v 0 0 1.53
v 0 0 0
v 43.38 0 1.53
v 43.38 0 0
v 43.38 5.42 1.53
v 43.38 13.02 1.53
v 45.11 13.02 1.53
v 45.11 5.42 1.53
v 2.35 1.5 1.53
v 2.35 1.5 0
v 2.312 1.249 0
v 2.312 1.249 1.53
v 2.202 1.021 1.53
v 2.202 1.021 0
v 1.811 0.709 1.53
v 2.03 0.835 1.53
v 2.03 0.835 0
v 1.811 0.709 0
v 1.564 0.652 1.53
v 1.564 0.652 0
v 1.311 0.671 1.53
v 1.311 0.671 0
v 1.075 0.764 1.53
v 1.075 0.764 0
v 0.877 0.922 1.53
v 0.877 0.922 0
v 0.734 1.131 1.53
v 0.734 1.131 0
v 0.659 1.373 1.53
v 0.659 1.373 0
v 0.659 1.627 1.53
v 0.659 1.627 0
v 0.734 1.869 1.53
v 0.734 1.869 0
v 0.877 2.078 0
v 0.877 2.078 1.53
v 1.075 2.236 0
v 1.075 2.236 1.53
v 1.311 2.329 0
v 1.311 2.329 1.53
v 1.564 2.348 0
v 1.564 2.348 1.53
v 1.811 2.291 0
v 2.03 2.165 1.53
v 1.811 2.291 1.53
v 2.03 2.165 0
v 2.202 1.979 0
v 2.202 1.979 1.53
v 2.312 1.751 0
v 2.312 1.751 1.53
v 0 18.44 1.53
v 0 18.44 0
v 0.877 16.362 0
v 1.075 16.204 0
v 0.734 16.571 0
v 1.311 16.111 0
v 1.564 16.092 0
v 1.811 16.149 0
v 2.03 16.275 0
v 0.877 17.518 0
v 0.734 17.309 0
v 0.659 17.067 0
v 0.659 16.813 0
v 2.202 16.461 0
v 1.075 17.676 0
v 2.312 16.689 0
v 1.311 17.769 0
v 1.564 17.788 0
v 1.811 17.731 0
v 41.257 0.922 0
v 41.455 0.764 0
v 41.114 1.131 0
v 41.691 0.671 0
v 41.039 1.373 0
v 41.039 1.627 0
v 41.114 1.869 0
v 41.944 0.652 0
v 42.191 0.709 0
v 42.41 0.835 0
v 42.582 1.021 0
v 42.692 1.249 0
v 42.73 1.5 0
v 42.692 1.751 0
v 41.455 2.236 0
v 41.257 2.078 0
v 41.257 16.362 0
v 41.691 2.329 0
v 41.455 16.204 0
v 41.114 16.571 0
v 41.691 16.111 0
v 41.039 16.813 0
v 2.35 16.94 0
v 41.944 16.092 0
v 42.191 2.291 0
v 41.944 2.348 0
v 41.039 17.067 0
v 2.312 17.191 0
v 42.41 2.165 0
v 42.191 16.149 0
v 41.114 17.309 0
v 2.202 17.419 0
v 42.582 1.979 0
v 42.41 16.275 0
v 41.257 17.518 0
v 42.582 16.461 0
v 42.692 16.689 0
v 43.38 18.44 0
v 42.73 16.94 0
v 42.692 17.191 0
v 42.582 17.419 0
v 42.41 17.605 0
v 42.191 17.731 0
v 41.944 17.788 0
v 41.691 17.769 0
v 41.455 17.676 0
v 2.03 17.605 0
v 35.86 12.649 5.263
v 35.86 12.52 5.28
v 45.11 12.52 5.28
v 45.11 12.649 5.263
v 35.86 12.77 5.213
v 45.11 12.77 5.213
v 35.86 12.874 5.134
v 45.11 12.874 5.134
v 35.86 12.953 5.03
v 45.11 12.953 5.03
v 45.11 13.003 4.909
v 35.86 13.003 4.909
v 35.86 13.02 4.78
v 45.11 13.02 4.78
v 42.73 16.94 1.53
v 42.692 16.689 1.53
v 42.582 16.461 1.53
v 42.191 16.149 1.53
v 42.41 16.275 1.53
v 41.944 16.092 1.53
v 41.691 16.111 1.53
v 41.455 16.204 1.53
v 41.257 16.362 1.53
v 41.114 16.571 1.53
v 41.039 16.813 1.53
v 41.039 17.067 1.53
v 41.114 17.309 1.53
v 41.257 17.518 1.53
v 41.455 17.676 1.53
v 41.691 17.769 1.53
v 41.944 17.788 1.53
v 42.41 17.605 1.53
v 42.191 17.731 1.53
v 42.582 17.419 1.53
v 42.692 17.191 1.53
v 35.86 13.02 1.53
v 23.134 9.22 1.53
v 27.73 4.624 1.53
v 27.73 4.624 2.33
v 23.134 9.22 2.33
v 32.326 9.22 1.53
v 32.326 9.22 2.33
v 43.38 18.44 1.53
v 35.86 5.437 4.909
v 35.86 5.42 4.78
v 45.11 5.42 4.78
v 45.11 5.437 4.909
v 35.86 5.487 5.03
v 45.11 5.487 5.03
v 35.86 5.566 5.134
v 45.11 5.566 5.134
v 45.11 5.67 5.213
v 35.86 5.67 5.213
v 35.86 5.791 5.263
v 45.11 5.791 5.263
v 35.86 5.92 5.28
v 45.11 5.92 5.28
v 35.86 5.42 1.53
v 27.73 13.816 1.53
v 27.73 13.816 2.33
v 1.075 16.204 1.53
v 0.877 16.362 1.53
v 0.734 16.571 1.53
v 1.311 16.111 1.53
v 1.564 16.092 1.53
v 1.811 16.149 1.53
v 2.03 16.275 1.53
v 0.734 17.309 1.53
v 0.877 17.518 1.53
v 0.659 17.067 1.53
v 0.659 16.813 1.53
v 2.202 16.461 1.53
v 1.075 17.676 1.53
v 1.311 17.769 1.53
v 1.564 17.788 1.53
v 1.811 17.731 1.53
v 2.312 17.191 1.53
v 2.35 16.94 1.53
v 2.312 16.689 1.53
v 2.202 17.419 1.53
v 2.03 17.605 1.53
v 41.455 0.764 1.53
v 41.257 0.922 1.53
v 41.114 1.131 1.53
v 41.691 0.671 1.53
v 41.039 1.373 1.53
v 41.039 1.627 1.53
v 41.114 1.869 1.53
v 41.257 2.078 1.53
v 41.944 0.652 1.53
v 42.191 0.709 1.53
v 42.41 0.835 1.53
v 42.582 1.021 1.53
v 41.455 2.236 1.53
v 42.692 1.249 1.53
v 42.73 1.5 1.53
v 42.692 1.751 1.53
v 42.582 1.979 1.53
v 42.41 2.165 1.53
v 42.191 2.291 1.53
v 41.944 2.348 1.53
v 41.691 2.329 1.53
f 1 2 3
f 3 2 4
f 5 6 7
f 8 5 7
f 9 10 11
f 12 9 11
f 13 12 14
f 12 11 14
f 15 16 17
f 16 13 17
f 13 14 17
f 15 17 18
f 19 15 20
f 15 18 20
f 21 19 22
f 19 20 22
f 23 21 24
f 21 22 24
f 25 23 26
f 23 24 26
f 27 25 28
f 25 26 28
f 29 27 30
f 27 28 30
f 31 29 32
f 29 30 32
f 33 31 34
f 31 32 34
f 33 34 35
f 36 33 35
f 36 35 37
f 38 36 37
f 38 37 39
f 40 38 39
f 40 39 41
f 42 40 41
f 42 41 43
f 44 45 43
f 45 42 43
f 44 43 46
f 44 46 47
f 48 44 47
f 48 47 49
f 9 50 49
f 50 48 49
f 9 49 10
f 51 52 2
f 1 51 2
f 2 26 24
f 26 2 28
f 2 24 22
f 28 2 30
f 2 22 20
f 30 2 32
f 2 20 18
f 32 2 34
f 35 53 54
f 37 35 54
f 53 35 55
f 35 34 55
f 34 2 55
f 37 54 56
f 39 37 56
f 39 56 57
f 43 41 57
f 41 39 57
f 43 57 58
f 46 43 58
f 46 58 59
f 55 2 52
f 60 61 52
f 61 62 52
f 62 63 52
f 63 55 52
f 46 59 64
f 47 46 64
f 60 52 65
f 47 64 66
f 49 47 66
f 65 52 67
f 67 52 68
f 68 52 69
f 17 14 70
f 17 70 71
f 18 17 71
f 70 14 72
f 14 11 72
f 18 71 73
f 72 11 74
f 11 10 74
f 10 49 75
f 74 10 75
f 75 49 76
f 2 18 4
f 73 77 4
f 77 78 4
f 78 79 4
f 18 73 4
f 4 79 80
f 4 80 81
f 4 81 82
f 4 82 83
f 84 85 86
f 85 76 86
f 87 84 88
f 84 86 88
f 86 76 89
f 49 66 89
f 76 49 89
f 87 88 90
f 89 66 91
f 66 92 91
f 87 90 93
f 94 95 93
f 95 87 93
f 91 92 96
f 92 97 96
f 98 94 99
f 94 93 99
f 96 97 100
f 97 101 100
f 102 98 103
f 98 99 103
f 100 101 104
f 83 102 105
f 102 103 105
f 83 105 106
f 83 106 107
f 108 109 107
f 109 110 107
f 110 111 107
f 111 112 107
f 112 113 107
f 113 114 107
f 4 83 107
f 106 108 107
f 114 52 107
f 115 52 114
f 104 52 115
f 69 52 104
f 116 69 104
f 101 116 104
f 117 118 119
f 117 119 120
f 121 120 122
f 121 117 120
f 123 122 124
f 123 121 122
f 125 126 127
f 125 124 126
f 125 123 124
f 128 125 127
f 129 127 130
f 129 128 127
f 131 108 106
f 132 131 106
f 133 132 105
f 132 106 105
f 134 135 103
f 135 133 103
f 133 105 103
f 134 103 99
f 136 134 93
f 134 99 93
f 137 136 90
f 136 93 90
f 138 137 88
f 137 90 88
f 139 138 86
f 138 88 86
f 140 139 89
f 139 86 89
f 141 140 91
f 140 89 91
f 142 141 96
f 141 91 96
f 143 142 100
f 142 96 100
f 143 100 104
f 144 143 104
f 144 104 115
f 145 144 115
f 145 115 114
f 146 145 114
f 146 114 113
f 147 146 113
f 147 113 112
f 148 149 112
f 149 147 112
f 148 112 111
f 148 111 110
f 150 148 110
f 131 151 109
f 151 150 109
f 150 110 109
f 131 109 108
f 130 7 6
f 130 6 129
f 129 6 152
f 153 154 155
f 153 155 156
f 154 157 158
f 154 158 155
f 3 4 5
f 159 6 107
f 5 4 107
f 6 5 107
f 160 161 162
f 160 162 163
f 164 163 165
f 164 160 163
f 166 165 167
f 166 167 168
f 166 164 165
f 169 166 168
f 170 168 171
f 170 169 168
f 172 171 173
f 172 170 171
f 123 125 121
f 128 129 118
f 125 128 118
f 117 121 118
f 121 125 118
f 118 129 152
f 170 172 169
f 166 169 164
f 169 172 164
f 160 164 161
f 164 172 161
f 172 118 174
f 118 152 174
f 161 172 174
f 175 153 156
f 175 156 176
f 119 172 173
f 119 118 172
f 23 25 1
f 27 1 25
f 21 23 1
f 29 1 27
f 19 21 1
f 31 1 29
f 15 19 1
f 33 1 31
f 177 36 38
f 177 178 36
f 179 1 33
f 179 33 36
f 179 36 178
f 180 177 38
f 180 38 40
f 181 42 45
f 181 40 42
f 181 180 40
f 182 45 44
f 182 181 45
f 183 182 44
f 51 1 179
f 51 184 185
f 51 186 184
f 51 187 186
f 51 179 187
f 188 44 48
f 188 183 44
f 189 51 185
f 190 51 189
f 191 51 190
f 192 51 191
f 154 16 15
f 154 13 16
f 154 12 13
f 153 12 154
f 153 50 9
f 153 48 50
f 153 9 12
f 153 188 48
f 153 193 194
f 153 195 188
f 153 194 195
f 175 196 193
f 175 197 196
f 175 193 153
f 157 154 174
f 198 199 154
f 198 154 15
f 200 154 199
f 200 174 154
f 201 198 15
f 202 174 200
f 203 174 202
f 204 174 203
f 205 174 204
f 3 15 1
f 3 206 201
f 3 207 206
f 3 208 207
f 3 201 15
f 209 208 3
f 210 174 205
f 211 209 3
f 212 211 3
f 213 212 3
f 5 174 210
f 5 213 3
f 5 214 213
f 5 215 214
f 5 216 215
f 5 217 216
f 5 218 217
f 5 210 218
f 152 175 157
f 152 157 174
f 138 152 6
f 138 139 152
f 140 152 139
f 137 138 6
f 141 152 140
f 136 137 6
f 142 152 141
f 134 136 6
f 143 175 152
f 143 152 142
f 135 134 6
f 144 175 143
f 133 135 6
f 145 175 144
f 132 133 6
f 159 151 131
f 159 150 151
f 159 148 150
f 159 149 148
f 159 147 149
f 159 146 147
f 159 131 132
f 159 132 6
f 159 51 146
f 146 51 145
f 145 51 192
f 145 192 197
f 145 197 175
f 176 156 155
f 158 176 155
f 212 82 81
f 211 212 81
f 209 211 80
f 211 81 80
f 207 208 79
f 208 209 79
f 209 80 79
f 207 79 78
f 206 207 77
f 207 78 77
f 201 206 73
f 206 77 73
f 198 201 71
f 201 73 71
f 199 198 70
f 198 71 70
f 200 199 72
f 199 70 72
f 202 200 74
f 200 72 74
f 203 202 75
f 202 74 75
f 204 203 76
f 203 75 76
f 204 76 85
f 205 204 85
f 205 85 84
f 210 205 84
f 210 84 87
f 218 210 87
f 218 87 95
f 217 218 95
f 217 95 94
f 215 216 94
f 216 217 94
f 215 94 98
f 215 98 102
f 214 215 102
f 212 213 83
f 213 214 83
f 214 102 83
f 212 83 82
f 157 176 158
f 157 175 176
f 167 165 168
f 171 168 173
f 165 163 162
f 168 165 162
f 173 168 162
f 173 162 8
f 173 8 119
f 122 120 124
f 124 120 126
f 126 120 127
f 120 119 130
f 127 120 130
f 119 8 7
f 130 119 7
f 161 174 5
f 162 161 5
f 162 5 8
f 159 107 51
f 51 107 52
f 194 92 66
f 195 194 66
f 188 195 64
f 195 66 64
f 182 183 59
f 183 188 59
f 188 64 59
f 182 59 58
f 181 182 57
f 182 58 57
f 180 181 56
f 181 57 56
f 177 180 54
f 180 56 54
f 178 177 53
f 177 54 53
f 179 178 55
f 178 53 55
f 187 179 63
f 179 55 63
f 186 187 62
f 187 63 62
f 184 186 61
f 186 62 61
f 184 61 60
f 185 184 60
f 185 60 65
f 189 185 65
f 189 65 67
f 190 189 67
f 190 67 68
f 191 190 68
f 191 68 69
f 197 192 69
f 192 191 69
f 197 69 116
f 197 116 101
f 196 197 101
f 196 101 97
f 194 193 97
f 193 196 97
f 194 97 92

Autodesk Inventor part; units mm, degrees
ref_plane "YZ Plane" through (0, 0, 0) normal (1, 0, 0) x (0, 1, 0)
ref_plane "XZ Plane" through (0, 0, 0) normal (0, 1, 0) x (-1, 0, 0)
ref_plane "XY Plane" through (0, 0, 0) normal (0, 0, 1) x (1, 0, 0)
sketch "Sketch1" plane through (0, 0, 0) normal (0, 0, 1) x (1, 0, 0)
  line L0 (0, 0) -> (43.38, 0)
  line L1 (43.38, 0) -> (43.38, 18.44)
  line L2 (43.38, 18.44) -> (0, 18.44)
  line L3 (0, 18.44) -> (0, 0)
  circle A0 centre (1.5, 16.94) radius 0.85
  circle A1 centre (1.5, 1.5) radius 0.85
  circle A2 centre (41.88, 16.94) radius 0.85
  circle A3 centre (41.88, 1.5) radius 0.85
  dimension "d0" = 43.38
  dimension "d1" = 18.44
  dimension "d2" = 1.7
  dimension "d3" = 1.5
  dimension "d4" = 1.5
  dimension "d5" = 1.5
  dimension "d6" = 1.5
extrude "Extrusion1" add sketch "Sketch1" along normal blind 1.53
sketch "Sketch2" plane through (0, 0, 1.53) normal (0, 0, 1) x (1, 0, 0)
  line L0 (23.1338, 9.22) -> (27.73, 13.8162)
  line L1 (27.73, 13.8162) -> (32.3262, 9.22)
  line L2 (32.3262, 9.22) -> (27.73, 4.6238)
  line L3 (27.73, 4.6238) -> (23.1338, 9.22)
  line L4 (0, 0) -> (43.38, 0) projected
  line L5 (0, 18.44) -> (0, 0) projected
  line L6 (43.38, 0) -> (43.38, 18.44) projected
  line L7 (35.86, 5.42) -> (45.11, 5.42)
  line L8 (45.11, 5.42) -> (45.11, 13.02)
  line L9 (45.11, 13.02) -> (35.86, 13.02)
  line L10 (35.86, 13.02) -> (35.86, 5.42)
  point P0 (0, 9.22)
  point P1 (45.11, 9.22)
  dimension "d9" = 45
  dimension "d10" = 6.5
  dimension "d11" = 15.65
  dimension "d12" = 9.25
  dimension "d13" = 7.6
  dimension "d14" = 1.73
extrude "Extrusion2" add sketch "Sketch2" along normal blind 3.75 contours L7 L10 L9 L6 | L6 L9 L8 L7
extrude "Extrusion3" add sketch "Sketch2" along normal blind 0.8 contours L0 L1 L2 L3
fillet "Fillet1" radius 0.5 2 edges at (40.485, 5.42, 5.28) (40.485, 13.02, 5.28)
properties part number "MICROCONTROLLER"
